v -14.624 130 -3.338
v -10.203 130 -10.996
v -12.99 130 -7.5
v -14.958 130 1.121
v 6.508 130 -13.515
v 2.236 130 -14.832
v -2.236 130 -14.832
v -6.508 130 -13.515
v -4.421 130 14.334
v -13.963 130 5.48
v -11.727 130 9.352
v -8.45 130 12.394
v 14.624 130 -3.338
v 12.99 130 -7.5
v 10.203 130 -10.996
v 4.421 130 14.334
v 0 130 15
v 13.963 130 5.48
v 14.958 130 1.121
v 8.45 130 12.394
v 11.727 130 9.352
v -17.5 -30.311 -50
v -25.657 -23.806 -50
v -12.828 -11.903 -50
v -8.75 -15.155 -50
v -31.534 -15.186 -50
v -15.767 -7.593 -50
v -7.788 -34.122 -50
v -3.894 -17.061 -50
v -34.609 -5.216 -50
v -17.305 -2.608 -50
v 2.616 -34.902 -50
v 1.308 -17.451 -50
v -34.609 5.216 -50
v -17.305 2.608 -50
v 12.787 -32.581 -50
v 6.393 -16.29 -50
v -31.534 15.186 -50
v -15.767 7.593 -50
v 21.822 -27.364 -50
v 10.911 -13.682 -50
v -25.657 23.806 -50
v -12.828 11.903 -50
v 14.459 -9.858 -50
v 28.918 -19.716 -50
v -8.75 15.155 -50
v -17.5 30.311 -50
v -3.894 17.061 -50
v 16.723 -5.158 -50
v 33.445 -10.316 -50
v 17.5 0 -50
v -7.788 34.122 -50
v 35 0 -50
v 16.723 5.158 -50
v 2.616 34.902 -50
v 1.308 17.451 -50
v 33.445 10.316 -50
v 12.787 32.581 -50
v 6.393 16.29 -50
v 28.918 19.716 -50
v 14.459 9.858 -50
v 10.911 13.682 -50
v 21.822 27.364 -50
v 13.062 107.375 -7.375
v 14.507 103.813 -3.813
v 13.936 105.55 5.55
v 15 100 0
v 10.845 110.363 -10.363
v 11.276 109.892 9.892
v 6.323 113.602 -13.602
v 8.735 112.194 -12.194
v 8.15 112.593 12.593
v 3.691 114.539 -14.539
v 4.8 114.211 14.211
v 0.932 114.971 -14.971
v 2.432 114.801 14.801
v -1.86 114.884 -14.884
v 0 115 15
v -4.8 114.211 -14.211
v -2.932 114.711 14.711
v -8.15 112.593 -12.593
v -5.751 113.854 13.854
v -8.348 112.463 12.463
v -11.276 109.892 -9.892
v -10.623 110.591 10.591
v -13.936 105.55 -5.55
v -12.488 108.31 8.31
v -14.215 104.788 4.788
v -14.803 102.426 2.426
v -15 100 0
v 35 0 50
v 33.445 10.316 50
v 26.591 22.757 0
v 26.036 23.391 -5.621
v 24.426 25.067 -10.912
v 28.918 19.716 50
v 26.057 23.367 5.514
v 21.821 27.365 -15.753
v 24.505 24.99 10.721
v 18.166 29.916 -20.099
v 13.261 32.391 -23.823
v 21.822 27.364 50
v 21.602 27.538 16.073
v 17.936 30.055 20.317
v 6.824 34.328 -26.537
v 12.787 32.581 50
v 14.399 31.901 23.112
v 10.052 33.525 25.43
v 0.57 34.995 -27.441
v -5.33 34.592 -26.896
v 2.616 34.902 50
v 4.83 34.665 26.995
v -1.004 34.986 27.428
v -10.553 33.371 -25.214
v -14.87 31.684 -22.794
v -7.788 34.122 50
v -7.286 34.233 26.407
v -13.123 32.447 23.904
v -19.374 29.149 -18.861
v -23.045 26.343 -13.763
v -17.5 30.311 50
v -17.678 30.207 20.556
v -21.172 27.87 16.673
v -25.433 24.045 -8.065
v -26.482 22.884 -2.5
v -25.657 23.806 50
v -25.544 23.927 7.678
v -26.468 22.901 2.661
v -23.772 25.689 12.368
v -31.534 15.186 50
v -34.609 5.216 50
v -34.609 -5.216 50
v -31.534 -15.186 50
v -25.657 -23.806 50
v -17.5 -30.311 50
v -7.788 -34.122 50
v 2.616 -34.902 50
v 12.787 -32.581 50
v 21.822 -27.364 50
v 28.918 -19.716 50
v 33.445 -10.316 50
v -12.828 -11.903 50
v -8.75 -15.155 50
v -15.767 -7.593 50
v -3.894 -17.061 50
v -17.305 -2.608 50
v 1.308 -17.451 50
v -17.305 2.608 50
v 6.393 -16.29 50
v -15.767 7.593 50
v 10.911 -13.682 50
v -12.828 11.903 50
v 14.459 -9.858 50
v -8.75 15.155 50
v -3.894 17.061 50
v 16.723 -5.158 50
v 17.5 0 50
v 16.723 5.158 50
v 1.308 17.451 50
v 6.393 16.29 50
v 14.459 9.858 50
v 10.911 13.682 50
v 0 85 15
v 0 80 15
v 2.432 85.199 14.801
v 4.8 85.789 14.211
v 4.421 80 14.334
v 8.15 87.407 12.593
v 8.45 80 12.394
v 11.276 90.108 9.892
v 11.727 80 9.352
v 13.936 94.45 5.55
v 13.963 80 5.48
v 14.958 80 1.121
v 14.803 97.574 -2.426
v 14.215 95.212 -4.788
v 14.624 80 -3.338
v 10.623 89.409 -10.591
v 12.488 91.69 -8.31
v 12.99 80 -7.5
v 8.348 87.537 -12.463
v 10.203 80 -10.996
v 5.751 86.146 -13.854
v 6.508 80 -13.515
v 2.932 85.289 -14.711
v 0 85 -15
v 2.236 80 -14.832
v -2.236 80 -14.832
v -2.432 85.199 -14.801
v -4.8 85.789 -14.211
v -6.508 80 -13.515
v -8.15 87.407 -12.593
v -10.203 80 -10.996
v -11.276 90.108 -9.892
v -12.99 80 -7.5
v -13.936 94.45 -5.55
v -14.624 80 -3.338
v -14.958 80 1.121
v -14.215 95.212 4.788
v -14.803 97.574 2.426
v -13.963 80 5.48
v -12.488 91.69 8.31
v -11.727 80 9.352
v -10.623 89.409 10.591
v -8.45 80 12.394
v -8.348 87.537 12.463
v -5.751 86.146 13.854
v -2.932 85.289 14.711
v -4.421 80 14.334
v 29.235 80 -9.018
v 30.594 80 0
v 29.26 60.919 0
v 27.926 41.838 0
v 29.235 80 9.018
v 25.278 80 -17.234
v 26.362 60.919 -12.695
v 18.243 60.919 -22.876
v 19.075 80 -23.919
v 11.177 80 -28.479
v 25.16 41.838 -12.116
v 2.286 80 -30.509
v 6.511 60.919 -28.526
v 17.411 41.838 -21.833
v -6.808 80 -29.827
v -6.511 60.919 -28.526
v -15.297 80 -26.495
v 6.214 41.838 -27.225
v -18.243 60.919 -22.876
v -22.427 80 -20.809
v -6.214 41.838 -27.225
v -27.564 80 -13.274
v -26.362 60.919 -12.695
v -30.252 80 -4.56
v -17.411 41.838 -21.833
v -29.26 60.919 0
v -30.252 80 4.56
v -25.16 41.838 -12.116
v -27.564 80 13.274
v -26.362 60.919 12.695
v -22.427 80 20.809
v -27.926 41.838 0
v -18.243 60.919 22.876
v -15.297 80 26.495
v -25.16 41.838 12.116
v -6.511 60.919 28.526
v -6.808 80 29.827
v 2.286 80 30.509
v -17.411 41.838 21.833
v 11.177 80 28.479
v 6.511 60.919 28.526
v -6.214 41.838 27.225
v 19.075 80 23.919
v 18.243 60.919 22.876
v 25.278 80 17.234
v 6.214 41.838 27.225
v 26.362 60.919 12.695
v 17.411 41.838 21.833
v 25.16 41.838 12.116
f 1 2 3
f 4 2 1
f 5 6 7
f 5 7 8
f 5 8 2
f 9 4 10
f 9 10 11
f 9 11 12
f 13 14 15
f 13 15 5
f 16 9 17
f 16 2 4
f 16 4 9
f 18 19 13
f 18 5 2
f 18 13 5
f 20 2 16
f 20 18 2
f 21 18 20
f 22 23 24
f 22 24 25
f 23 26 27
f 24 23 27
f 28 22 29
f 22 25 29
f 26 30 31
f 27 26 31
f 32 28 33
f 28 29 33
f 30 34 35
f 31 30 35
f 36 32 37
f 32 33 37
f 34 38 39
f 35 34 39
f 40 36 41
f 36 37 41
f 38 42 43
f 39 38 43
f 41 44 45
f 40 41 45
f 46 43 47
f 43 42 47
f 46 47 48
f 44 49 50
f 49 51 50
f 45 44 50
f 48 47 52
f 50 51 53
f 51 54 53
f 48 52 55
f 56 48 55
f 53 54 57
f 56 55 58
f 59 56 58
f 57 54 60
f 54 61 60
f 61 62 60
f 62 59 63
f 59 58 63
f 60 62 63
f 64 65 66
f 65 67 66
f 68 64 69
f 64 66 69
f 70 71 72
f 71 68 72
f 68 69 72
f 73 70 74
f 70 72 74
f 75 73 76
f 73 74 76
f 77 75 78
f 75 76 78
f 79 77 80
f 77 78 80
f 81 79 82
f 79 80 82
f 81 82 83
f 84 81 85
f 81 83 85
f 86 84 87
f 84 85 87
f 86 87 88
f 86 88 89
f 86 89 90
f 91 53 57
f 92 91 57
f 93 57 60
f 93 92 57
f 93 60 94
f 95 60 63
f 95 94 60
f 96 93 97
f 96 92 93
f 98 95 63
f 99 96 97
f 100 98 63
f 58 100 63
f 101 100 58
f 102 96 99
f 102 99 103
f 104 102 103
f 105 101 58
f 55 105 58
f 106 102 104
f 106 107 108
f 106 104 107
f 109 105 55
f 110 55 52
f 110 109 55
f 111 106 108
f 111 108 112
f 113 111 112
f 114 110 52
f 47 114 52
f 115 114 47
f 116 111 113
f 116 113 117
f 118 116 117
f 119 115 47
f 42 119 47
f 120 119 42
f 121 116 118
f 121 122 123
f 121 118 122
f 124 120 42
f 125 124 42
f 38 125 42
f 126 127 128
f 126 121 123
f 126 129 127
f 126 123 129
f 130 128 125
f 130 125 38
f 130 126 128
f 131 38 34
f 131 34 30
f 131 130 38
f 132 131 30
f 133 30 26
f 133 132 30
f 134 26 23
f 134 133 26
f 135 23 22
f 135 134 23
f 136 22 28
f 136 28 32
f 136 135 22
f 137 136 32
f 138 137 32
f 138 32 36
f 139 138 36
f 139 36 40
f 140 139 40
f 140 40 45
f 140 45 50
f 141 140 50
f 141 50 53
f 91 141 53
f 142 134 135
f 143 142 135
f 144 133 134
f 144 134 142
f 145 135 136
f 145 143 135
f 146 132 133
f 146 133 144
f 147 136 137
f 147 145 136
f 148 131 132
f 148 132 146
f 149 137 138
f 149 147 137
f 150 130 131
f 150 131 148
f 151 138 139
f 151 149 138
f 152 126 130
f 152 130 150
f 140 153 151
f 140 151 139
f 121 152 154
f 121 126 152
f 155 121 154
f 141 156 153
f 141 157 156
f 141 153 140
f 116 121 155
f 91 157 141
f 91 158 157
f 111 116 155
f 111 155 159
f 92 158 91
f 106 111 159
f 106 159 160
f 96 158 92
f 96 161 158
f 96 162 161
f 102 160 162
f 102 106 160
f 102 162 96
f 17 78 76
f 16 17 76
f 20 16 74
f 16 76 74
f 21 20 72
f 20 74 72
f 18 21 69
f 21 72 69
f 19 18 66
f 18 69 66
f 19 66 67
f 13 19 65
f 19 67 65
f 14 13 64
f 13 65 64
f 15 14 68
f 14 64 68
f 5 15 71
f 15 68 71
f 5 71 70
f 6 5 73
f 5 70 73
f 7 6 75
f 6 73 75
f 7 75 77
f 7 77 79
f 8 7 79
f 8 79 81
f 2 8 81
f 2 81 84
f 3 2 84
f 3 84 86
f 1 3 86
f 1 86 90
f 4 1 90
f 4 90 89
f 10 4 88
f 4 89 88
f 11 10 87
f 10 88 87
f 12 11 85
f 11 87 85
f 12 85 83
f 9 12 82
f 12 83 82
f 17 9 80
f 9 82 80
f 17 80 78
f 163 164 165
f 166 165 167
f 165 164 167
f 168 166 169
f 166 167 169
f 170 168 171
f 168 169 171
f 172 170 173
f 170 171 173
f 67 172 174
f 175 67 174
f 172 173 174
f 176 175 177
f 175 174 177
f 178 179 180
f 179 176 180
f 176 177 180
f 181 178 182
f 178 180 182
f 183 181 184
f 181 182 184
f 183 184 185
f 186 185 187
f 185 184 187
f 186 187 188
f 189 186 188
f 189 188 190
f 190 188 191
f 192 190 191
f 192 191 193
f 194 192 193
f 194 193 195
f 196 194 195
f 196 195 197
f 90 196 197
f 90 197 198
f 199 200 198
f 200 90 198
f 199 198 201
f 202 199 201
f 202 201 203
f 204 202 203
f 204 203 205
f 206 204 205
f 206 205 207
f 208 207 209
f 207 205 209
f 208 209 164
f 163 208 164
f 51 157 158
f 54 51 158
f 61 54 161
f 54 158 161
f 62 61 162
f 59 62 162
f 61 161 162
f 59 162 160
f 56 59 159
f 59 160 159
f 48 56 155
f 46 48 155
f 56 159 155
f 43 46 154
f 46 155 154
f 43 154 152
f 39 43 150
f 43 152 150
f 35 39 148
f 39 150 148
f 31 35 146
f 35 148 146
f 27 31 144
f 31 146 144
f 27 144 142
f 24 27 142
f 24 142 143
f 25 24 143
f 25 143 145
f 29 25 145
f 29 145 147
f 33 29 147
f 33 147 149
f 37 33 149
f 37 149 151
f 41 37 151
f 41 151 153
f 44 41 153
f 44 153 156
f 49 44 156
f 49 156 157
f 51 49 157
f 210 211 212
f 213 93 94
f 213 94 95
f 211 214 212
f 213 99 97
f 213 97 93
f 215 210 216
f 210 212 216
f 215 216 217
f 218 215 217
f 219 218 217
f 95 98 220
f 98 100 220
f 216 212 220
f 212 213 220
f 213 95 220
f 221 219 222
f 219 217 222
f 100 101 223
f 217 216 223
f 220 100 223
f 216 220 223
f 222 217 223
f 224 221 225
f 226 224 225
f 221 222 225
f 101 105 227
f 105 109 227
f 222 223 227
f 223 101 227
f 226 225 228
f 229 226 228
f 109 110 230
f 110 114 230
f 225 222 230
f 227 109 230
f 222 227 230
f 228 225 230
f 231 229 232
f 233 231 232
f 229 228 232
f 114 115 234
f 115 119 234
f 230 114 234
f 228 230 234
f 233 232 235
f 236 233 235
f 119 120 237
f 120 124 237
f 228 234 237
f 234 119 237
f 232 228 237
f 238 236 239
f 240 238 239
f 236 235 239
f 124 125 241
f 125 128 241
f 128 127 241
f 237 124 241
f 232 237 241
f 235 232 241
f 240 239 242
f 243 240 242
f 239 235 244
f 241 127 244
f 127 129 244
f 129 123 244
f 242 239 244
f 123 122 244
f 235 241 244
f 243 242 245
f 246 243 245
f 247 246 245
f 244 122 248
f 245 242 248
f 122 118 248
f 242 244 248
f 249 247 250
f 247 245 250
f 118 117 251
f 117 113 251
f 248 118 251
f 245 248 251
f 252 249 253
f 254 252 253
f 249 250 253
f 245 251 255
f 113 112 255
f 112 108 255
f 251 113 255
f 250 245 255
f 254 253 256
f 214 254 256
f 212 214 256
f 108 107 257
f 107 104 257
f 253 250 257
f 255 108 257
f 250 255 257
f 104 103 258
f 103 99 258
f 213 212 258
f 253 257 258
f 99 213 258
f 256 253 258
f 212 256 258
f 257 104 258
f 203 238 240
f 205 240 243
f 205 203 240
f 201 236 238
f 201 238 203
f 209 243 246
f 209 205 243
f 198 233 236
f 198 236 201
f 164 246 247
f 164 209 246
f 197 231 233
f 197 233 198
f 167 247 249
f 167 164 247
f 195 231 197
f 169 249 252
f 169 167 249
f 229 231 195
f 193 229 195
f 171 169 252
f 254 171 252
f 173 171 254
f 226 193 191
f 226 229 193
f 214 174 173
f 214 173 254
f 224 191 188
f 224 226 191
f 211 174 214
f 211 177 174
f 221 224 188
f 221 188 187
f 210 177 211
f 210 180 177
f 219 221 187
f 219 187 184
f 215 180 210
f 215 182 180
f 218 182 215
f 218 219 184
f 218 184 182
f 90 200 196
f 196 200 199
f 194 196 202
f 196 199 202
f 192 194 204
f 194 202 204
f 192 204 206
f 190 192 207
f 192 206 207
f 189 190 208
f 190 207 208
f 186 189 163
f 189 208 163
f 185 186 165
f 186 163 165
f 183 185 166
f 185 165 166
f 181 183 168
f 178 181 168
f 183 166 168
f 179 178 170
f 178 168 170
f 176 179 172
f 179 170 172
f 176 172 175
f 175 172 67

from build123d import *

# Parameters (mm, degrees)
SKETCH1_R           = 35
BOSS_EXTRUDE1_DEPTH = 50
SKETCH2_R           = 25
BOSS_EXTRUDE2_DEPTH = 80
BOSS_EXTRUDE2_DRAFT = -4
SKETCH8_R           = 15
CUT_EXTRUDE5_DEPTH  = 133.759180635
SKETCH7_R           = 15
BOSS_EXTRUDE3_DEPTH = 50
SKETCH4_R           = 17.5
CUT_EXTRUDE2_DEPTH  = 168.705098393
SKETCH6_R           = 15
CUT_EXTRUDE3_DEPTH  = 168.705098393


with BuildPart() as part:
    # Sketch1 → Boss-Extrude1 (new, symmetric)
    with BuildSketch(Plane.XY):
        Circle(SKETCH1_R)
    extrude(amount=BOSS_EXTRUDE1_DEPTH, both=True)


with BuildPart() as boss_extrude2_tool:
    # Sketch2 → Boss-Extrude2 (with draft: the straight prism first)
    with BuildSketch(Plane(origin=(0, 0, 0), x_dir=(1, 0, 0), z_dir=(0, 1, 0))):
        Circle(SKETCH2_R)
    extrude(amount=BOSS_EXTRUDE2_DEPTH)
    # Boss-Extrude2: the draft: its side faces are tilted about the plane it starts from
    boss_extrude2_sides = [boss_extrude2_tool.faces().sort_by_distance(p)[0] for p in [
        (-25, 40, 0),
    ]]
    draft(boss_extrude2_sides, Plane(origin=(0, 0, 0), x_dir=(1, 0, 0), z_dir=(0, 1, 0)), BOSS_EXTRUDE2_DRAFT)


with BuildPart() as part_1:
    add(part.part)

    # Boss-Extrude2: add boss_extrude2_tool
    add(boss_extrude2_tool.part)

    # Sketch8 → Cut-Extrude5 (cut, through all)
    with BuildSketch(Plane(origin=(0, 0, -50), x_dir=(-1, 0, 0), z_dir=(0, 0, -1))):
        Circle(SKETCH8_R)
    extrude(amount=-CUT_EXTRUDE5_DEPTH, mode=Mode.SUBTRACT)

    # Sketch7 → Boss-Extrude3 (add)
    with BuildSketch(Plane(origin=(0, 80, 0), x_dir=(1, 0, 0), z_dir=(0, 1, 0))):
        with Locations(Location((0, 0, 0), (0, 0, 270))):
            Circle(SKETCH7_R)
    extrude(amount=BOSS_EXTRUDE3_DEPTH)

    # Sketch4 → Cut-Extrude2 (cut, through all)
    with BuildSketch(Plane.XY.offset(50)):
        Circle(SKETCH4_R)
    extrude(amount=-CUT_EXTRUDE2_DEPTH, mode=Mode.SUBTRACT)

    # Sketch6 → Cut-Extrude3 (cut, through all)
    with BuildSketch(Plane.XY.offset(50)):
        with Locations((0, 100)):
            Circle(SKETCH6_R)
    extrude(amount=-CUT_EXTRUDE3_DEPTH, mode=Mode.SUBTRACT)


with BuildPart() as cut_extrude3_piece_1:
    # of the separate pieces the step leaves, piece 1, a body of its own (cut_extrude3_pieces)
    add(part_1.part.solids().sort_by_distance((26.591353454, 22.757414648, 0))[0])


with BuildPart() as cut_extrude3_piece_2:
    # of the separate pieces the step leaves, piece 2, a body of its own (cut_extrude3_pieces)
    add(part_1.part.solids().sort_by_distance((0, 115, 15))[0])


solid = Compound([cut_extrude3_piece_1.part, cut_extrude3_piece_2.part])
